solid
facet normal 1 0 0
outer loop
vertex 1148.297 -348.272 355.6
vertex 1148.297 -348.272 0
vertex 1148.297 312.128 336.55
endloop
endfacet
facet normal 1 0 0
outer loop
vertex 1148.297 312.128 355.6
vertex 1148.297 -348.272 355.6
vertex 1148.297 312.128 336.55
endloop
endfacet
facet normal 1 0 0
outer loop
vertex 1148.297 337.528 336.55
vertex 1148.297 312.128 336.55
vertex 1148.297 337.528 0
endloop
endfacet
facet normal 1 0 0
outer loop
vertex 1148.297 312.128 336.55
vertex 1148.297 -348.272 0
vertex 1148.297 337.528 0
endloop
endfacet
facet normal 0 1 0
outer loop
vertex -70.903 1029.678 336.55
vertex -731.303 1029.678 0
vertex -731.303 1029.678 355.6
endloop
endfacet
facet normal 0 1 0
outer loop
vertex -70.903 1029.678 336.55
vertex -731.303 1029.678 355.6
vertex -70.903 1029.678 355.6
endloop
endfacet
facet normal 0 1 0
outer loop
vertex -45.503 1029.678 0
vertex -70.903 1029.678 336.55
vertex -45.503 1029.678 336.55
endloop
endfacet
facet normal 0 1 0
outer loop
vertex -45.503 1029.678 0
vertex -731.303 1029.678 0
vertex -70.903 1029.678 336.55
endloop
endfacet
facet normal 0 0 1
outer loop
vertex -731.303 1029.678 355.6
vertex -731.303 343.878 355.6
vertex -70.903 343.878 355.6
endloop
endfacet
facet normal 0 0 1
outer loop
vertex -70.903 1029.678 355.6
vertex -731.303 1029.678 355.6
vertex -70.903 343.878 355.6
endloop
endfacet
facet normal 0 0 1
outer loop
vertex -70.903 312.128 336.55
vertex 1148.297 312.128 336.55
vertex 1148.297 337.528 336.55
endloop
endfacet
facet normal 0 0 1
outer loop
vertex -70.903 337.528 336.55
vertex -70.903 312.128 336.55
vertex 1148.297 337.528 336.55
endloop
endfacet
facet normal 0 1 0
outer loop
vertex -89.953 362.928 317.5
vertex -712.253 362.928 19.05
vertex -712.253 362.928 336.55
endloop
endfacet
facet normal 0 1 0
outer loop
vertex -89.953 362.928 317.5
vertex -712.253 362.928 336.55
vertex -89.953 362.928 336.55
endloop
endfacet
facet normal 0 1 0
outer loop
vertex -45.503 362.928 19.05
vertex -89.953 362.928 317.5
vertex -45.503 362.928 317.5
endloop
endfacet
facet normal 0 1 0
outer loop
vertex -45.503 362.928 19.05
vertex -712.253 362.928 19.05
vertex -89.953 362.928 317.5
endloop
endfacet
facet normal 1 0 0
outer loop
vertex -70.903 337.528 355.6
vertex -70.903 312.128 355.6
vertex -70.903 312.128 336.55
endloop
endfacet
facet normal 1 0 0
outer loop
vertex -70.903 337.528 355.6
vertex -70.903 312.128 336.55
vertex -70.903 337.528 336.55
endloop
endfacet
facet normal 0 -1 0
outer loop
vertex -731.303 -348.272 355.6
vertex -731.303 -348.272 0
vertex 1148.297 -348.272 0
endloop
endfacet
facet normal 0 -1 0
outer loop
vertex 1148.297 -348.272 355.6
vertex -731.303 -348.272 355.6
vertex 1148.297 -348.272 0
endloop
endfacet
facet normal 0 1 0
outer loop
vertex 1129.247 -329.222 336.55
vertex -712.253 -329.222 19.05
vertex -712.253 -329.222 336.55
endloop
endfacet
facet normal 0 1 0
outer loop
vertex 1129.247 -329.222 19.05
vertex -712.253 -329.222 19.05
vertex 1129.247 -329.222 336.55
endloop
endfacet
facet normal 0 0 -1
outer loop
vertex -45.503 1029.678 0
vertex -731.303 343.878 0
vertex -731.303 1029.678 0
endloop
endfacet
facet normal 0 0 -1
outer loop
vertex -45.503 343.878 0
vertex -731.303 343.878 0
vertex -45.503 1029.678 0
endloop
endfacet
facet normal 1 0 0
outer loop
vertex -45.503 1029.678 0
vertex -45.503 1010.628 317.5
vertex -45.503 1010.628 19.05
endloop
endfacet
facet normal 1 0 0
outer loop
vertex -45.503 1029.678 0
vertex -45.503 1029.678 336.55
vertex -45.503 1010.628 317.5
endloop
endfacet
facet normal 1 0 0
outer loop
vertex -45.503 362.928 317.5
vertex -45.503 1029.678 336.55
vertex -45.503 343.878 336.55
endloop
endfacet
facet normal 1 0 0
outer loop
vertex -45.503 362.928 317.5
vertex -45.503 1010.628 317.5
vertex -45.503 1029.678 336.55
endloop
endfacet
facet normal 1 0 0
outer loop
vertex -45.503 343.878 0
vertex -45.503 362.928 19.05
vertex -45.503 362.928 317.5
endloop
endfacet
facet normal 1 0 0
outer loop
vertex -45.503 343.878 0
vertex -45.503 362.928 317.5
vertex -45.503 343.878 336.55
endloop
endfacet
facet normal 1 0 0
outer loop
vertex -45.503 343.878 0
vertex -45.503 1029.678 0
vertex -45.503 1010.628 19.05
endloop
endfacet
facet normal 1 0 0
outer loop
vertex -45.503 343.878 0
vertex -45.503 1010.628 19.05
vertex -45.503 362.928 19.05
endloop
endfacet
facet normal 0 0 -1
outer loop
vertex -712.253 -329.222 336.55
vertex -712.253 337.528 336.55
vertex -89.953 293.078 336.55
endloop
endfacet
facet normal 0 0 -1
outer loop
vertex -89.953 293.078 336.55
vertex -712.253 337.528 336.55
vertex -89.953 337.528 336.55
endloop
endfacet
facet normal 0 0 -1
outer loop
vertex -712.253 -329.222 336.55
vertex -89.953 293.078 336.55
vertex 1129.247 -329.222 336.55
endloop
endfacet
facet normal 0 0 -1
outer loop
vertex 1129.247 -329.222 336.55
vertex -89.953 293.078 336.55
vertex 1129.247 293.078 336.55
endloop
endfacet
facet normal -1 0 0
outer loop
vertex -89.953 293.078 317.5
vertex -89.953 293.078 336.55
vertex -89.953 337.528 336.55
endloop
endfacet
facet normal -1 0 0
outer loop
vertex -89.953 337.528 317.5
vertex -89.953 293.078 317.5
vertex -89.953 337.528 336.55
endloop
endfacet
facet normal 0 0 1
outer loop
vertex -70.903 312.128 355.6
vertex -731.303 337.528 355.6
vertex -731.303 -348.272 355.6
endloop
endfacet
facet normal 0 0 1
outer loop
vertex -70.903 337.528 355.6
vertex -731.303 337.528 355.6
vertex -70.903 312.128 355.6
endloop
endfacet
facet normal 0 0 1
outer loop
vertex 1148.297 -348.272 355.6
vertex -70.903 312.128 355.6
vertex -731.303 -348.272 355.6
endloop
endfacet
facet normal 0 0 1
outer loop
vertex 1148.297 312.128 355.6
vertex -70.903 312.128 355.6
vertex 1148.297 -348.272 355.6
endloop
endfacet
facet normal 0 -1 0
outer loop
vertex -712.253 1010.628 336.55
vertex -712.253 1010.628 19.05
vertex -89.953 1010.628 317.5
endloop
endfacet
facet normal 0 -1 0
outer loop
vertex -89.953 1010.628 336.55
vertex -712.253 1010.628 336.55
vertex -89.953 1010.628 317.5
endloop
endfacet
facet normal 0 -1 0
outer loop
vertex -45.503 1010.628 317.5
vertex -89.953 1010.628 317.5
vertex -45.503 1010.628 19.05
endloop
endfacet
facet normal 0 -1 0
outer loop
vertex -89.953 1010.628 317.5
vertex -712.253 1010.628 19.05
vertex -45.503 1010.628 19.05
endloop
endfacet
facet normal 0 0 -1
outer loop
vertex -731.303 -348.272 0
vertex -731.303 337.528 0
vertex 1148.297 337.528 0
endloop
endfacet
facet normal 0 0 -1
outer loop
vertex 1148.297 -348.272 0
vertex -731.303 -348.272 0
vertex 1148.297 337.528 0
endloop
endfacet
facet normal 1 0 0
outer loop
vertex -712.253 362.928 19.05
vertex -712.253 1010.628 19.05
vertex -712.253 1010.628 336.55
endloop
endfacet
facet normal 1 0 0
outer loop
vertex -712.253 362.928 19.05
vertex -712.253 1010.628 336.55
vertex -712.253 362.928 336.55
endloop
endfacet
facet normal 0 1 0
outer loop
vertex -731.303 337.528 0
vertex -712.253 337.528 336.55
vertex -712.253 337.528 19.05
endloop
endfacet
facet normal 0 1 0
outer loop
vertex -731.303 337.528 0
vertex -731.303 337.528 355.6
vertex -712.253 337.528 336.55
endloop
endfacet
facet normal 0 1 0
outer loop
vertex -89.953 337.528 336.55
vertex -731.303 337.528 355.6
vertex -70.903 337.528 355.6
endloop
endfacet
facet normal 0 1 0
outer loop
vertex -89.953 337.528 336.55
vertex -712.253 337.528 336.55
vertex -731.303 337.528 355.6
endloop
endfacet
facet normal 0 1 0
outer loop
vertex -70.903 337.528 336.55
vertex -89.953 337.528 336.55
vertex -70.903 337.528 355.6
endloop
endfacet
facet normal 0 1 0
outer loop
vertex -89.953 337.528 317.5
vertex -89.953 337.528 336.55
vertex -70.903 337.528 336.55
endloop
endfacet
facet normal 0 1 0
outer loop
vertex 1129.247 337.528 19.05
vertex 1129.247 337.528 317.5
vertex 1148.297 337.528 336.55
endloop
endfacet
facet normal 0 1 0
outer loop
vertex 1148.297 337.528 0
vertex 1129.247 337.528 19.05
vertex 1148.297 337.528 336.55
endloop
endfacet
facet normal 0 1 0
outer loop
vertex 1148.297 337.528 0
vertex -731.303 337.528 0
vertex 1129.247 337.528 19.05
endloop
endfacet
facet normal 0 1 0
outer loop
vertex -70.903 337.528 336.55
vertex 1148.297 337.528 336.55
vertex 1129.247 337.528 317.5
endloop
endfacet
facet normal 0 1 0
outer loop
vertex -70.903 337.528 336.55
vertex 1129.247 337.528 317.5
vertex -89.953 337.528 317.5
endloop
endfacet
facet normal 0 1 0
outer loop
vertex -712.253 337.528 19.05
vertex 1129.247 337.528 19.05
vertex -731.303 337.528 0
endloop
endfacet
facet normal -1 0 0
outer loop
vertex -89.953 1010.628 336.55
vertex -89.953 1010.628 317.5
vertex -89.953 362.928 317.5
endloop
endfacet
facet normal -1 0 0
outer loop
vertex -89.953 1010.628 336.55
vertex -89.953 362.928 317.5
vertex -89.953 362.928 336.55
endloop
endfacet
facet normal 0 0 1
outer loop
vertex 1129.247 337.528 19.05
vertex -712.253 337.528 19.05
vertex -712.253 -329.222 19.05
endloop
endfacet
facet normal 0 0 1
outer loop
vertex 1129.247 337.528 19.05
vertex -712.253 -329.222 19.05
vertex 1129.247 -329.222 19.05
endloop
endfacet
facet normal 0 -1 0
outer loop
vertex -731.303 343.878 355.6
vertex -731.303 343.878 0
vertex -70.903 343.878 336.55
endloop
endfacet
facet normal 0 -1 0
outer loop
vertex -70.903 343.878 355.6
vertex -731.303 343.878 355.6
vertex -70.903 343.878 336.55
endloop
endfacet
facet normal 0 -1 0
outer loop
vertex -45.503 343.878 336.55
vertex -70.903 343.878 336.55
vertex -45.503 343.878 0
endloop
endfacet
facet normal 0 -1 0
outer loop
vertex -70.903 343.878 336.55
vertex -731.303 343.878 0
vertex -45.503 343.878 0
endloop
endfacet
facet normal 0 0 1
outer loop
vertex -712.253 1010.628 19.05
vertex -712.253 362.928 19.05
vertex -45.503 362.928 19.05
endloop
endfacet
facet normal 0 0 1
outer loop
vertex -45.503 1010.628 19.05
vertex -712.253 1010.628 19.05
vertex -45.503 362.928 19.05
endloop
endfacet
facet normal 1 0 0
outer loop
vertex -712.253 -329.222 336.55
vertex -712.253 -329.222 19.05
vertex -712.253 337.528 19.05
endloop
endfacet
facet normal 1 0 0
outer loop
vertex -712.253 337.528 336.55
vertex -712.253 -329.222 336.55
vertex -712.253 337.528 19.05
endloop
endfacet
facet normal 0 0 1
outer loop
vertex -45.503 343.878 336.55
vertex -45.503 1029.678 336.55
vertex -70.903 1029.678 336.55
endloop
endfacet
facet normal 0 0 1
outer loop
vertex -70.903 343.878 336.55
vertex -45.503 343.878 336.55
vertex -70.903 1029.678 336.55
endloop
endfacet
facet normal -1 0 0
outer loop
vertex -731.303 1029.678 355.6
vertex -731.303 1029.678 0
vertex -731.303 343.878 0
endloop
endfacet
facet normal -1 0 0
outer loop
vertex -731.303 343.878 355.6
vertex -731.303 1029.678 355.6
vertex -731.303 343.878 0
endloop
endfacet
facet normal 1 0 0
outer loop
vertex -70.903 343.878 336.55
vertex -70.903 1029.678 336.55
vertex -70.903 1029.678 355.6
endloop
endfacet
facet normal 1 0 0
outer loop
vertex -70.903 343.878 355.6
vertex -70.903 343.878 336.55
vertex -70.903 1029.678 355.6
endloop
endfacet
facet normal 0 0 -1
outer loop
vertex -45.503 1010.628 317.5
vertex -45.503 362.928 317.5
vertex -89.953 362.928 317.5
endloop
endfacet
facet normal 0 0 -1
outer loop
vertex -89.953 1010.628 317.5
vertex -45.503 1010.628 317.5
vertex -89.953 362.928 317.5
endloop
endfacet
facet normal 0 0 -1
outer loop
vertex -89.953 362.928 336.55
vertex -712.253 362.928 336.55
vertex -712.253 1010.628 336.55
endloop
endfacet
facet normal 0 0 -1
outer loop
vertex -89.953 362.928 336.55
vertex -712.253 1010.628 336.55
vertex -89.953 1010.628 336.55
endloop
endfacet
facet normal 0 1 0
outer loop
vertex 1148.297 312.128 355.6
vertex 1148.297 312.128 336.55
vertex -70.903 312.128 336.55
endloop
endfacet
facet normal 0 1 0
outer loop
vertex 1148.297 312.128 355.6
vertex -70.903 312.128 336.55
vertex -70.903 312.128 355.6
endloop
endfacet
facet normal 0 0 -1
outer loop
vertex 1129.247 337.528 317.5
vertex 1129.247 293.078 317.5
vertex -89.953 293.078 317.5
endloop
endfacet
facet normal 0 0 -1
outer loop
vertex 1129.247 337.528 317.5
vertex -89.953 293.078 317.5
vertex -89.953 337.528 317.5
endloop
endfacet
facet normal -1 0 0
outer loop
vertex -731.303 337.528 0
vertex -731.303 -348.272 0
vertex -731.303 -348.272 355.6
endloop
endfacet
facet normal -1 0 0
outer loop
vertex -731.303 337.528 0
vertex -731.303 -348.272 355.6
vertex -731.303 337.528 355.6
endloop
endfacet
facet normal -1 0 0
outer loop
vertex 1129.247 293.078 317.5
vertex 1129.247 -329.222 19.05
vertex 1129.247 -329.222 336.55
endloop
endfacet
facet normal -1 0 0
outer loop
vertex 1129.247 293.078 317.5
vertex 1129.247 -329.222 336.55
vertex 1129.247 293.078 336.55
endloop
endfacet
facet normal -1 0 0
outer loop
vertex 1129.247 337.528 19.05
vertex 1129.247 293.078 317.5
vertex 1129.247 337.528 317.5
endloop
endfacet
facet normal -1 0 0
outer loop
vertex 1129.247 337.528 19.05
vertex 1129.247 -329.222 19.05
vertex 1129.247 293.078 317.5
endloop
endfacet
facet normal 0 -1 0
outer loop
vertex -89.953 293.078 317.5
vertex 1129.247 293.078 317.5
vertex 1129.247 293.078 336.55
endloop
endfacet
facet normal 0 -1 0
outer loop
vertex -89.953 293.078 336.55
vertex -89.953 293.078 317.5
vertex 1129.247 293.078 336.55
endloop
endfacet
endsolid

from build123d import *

# Parameters (mm, degrees)
F0_W     = 1879.6
F0_H     = 685.8
F1_DEPTH = 355.6
F2_W     = 25.4
F2_H     = 19.05
F3_DEPTH = 1219.2
F4_T     = -19.05
F5_W     = 685.8
F5_H     = 685.8
F6_DEPTH = 355.6
F7_W     = 25.4
F7_H     = 19.05
F8_DEPTH = 685.8
F9_T     = -19.05


with BuildPart() as f1:
    # F0 (on Top) → F1 (new body)
    with BuildSketch(Plane.XY):
        with Locations((208.4965914682, -5.3716953844)):
            Rectangle(F0_W, F0_H)
    extrude(amount=F1_DEPTH)

    # F2 (on face) → F3 (cut)
    with BuildSketch(Plane.YZ.offset(1148.2965914682)):
        with Locations((324.8283046156, 346.075)):
            Rectangle(F2_W, F2_H)
    extrude(amount=-F3_DEPTH, mode=Mode.SUBTRACT)

    # F4
    f4_openings = [f1.faces().sort_by_distance(p)[0] for p in [
        (196.609391, 337.528305, 171.7421),
    ]]
    offset(amount=F4_T, openings=f4_openings, kind=Kind.INTERSECTION)


with BuildPart() as f6:
    # F5 (on face) → F6 (new body)
    with BuildSketch(Plane(origin=(0, 0, 0), x_dir=(1, 0, 0), z_dir=(0, 0, -1))):
        with Locations((-388.4034085318, -686.7783046156)):
            Rectangle(F5_W, F5_H)
    extrude(amount=-F6_DEPTH)

    # F7 (on face) → F8 (cut, through all)
    with BuildSketch(Plane(origin=(0, 1029.6783046156, 0), x_dir=(-1, 0, 0), z_dir=(0, 1, 0))):
        with Locations((58.2034085318, 346.075)):
            Rectangle(F7_W, F7_H)
    extrude(amount=-F8_DEPTH, mode=Mode.SUBTRACT)

    # F9
    f9_openings = [f6.faces().sort_by_distance(p)[0] for p in [
        (-45.503409, 686.778305, 168.275),
    ]]
    offset(amount=F9_T, openings=f9_openings, kind=Kind.INTERSECTION)


solid = Compound([f1.part, f6.part])
